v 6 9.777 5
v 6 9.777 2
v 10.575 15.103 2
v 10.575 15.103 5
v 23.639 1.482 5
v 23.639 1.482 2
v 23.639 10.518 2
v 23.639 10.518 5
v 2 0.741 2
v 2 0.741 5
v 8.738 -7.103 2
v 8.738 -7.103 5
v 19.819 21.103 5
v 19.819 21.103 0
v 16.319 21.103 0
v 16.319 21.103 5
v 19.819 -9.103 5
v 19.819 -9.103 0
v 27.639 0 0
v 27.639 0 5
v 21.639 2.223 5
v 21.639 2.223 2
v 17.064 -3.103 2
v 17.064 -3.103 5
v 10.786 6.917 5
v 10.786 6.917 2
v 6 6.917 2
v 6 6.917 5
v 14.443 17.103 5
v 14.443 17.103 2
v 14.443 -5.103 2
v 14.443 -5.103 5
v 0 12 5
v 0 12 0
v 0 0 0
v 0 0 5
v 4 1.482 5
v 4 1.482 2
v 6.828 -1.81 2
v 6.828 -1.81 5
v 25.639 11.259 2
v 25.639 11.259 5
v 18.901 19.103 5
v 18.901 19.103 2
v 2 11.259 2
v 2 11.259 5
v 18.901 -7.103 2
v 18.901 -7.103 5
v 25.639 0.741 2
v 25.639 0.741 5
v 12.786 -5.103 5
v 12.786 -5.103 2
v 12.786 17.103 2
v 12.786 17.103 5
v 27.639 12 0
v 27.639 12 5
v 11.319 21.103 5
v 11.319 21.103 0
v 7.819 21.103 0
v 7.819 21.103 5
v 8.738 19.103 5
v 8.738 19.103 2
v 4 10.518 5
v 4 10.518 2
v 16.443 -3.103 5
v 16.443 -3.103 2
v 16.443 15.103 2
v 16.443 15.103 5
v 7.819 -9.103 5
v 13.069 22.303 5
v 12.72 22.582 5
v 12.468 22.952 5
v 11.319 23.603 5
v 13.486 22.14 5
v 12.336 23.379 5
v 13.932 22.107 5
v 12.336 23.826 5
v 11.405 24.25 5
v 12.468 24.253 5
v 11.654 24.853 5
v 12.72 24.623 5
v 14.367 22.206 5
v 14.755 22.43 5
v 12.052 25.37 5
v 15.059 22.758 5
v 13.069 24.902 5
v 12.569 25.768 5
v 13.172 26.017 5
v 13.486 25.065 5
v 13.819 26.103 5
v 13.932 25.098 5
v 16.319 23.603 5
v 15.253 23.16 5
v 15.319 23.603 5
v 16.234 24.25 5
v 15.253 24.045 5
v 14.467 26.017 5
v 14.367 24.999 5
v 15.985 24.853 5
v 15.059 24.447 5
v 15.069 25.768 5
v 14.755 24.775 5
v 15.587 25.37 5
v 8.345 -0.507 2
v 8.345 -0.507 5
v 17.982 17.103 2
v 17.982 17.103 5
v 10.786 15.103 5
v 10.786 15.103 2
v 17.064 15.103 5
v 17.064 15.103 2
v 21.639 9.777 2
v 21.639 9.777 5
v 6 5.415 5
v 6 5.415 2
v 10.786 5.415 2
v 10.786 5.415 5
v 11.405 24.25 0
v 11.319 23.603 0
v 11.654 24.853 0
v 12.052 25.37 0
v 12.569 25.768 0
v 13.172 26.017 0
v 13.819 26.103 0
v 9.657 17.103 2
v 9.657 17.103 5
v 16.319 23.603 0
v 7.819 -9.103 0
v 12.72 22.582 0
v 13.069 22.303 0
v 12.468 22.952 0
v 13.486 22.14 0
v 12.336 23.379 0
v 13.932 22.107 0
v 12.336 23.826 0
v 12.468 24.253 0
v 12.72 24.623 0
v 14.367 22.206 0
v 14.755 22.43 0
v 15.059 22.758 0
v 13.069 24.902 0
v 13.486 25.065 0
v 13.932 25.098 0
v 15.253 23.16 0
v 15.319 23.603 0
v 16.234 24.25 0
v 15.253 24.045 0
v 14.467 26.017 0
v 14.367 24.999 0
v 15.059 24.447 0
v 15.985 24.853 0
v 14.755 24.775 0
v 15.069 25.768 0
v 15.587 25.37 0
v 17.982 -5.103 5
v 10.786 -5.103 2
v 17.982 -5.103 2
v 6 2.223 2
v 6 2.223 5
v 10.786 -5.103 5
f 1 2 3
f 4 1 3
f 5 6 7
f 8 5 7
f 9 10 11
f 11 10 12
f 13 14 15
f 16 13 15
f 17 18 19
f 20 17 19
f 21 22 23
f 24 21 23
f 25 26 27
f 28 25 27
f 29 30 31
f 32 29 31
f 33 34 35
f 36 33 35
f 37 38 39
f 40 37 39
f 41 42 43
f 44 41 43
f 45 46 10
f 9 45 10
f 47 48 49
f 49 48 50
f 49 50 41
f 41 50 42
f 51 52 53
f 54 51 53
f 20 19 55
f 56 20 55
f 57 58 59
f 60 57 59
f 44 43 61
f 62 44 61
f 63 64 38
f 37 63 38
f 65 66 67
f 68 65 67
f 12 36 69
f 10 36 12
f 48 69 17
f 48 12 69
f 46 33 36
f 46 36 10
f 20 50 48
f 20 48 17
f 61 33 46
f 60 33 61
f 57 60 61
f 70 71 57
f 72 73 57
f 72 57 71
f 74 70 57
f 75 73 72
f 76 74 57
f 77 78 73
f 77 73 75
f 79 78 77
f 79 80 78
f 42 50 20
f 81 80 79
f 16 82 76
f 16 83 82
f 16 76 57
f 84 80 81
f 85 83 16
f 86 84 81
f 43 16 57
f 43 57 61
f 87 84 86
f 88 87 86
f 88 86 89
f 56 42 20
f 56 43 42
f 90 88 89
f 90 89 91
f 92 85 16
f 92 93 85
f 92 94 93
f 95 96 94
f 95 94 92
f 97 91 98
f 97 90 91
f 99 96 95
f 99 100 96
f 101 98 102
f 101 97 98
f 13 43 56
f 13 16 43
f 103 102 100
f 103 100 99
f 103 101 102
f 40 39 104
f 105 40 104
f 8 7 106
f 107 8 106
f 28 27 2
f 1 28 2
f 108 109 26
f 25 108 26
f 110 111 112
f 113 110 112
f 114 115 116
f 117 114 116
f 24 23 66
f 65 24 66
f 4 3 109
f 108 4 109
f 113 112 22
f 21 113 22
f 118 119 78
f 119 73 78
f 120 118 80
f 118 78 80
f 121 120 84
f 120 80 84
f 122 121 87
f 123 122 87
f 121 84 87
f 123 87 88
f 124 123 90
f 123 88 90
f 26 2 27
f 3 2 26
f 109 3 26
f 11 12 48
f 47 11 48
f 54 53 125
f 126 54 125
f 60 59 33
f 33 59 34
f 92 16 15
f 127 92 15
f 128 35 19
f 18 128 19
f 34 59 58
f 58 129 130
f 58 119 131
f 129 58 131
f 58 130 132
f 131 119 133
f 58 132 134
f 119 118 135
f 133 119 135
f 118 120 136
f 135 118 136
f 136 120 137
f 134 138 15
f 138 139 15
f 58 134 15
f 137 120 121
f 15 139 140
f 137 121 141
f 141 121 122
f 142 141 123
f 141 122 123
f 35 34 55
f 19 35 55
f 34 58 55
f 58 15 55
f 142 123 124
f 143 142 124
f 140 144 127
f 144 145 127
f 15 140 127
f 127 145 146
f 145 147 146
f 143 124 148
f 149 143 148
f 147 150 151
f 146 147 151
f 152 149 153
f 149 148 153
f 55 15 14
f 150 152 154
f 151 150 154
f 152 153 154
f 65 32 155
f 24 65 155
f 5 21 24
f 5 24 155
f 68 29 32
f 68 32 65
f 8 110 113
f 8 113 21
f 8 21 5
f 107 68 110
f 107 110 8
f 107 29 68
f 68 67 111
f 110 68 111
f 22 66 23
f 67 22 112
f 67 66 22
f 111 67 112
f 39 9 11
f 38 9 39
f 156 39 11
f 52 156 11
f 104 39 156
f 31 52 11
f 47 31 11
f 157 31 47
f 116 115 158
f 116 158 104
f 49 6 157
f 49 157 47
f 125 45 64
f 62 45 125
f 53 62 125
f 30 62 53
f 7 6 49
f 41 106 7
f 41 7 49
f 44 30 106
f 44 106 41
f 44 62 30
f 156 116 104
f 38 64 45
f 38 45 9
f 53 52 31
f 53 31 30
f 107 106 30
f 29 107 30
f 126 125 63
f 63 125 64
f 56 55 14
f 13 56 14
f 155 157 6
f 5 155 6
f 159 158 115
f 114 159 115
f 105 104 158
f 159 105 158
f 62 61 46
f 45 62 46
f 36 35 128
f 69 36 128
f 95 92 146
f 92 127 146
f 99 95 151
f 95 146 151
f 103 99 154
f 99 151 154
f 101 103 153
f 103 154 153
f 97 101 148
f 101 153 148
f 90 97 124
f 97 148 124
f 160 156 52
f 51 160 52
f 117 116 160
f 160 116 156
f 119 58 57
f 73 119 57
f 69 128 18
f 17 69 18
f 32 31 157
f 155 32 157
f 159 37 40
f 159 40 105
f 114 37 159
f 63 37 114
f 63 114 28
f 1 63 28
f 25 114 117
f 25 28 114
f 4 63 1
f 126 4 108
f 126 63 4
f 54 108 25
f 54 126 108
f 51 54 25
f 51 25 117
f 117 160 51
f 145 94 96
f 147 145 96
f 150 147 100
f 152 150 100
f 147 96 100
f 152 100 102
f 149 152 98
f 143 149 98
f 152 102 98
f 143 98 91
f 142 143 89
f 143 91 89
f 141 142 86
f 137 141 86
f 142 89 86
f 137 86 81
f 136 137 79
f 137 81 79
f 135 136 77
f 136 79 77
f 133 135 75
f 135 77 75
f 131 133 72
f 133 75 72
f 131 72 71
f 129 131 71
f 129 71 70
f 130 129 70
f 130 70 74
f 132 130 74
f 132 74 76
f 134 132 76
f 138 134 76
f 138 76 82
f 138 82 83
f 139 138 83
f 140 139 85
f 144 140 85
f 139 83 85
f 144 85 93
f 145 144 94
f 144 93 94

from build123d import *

# Parameters (mm, degrees)
F1_DEPTH  = 5
F3_DEPTH  = 3
F5_DEPTH  = 3
F7_DEPTH  = 5
F8_R      = 2.49999
F9_R      = 1.5
F10_DEPTH = 5


# Not quite as in the source:
# - a fillet or chamfer is up to 0.001 mm smaller than in the source, because OpenCascade refuses the exact size


with BuildPart() as f1:
    # F0 (on Top) → F1 (new body)
    with BuildSketch(Plane.XY):
        Polygon((0, 6), (0, 0), (7.8194713464, -9.1025198634), (13.8194713464, -9.1025198634), (19.8194713464, -9.1025198634), (27.6389426928, 0), (27.6389426928, 6), (27.6389426928, 12), (19.8194713464, 21.1025198634), (13.8194713464, 21.1025198634), (7.8194713464, 21.1025198634), (0, 12), align=None)
    extrude(amount=F1_DEPTH)

    # F2 (on face) → F3 (cut)
    with BuildSketch(Plane.XY.offset(5)):
        Polygon((2, 11.2589063868), (2, 0.7410936132), (8.7380145007, -7.1025198634), (18.9009281921, -7.1025198634), (25.6389426928, 0.7410936132), (25.6389426928, 11.2589063868), (18.9009281921, 19.1025198634), (8.7380145007, 19.1025198634), align=None)
    extrude(amount=-F3_DEPTH, mode=Mode.SUBTRACT)

    # F4 (on face) → F5 (join)
    with BuildSketch(Plane.XY.offset(2)):
        Polygon((17.9823850378, -5.1025198634), (23.6389426928, 1.4821872264), (23.6389426928, 10.5178127736), (17.9823850378, 17.1025198634), (14.4432382658, 17.1025198634), (14.4432382658, -5.1025198634), align=None)
        Polygon((16.4432382658, -3.1025198634), (16.4432382658, 15.1025198634), (17.0638418835, 15.1025198634), (21.6389426928, 9.7767191605), (21.6389426928, 2.2232808395), (17.0638418835, -3.1025198634), align=None, mode=Mode.SUBTRACT)
        Polygon((10.7860844582, -3.1025198634), (10.7860844582, -5.1025198634), (12.7860844582, -5.1025198634), (12.7860844582, 17.1025198634), (9.6565576549, 17.1025198634), (4, 10.5178127736), (4, 1.4821872264), (6.8282788275, -1.8101663185), (8.3453654714, -0.5069210941), (6, 2.2232808395), (6, 5.4149306379), (10.7860844582, 5.4149306379), align=None)
        Polygon((6, 9.7767191605), (10.5751008092, 15.1025198634), (10.7860844582, 15.1025198634), (10.7860844582, 6.9169756025), (6, 6.9169756025), align=None, mode=Mode.SUBTRACT)
    extrude(amount=F5_DEPTH)

    # F6 (on face) → F7 (join)
    with BuildSketch(Plane(origin=(0, 21.1025198634, 0), x_dir=(-1, 0, 0), z_dir=(0, 1, 0))):
        Polygon((-11.3194713464, 5), (-13.8194713464, 5), (-16.3194713464, 5), (-16.3194713464, 0), (-11.3194713464, 0), align=None)
    extrude(amount=F7_DEPTH)

    # F8 (radius 2.5 in the source; OpenCascade refuses exactly that, so slightly less here)
    f8_edges = [f1.edges().sort_by_distance(p)[0] for p in [
        (11.319471, 26.10252, 2.5),
        (16.319471, 26.10252, 2.5),
    ]]
    fillet(f8_edges, radius=F8_R)

    # F9 (on face) → F10 (cut)
    with BuildSketch(Plane.XY.offset(5)):
        with Locations((13.8194713464, 23.6025198634)):
            Circle(F9_R)
    extrude(amount=-F10_DEPTH, mode=Mode.SUBTRACT)


solid = f1.part
